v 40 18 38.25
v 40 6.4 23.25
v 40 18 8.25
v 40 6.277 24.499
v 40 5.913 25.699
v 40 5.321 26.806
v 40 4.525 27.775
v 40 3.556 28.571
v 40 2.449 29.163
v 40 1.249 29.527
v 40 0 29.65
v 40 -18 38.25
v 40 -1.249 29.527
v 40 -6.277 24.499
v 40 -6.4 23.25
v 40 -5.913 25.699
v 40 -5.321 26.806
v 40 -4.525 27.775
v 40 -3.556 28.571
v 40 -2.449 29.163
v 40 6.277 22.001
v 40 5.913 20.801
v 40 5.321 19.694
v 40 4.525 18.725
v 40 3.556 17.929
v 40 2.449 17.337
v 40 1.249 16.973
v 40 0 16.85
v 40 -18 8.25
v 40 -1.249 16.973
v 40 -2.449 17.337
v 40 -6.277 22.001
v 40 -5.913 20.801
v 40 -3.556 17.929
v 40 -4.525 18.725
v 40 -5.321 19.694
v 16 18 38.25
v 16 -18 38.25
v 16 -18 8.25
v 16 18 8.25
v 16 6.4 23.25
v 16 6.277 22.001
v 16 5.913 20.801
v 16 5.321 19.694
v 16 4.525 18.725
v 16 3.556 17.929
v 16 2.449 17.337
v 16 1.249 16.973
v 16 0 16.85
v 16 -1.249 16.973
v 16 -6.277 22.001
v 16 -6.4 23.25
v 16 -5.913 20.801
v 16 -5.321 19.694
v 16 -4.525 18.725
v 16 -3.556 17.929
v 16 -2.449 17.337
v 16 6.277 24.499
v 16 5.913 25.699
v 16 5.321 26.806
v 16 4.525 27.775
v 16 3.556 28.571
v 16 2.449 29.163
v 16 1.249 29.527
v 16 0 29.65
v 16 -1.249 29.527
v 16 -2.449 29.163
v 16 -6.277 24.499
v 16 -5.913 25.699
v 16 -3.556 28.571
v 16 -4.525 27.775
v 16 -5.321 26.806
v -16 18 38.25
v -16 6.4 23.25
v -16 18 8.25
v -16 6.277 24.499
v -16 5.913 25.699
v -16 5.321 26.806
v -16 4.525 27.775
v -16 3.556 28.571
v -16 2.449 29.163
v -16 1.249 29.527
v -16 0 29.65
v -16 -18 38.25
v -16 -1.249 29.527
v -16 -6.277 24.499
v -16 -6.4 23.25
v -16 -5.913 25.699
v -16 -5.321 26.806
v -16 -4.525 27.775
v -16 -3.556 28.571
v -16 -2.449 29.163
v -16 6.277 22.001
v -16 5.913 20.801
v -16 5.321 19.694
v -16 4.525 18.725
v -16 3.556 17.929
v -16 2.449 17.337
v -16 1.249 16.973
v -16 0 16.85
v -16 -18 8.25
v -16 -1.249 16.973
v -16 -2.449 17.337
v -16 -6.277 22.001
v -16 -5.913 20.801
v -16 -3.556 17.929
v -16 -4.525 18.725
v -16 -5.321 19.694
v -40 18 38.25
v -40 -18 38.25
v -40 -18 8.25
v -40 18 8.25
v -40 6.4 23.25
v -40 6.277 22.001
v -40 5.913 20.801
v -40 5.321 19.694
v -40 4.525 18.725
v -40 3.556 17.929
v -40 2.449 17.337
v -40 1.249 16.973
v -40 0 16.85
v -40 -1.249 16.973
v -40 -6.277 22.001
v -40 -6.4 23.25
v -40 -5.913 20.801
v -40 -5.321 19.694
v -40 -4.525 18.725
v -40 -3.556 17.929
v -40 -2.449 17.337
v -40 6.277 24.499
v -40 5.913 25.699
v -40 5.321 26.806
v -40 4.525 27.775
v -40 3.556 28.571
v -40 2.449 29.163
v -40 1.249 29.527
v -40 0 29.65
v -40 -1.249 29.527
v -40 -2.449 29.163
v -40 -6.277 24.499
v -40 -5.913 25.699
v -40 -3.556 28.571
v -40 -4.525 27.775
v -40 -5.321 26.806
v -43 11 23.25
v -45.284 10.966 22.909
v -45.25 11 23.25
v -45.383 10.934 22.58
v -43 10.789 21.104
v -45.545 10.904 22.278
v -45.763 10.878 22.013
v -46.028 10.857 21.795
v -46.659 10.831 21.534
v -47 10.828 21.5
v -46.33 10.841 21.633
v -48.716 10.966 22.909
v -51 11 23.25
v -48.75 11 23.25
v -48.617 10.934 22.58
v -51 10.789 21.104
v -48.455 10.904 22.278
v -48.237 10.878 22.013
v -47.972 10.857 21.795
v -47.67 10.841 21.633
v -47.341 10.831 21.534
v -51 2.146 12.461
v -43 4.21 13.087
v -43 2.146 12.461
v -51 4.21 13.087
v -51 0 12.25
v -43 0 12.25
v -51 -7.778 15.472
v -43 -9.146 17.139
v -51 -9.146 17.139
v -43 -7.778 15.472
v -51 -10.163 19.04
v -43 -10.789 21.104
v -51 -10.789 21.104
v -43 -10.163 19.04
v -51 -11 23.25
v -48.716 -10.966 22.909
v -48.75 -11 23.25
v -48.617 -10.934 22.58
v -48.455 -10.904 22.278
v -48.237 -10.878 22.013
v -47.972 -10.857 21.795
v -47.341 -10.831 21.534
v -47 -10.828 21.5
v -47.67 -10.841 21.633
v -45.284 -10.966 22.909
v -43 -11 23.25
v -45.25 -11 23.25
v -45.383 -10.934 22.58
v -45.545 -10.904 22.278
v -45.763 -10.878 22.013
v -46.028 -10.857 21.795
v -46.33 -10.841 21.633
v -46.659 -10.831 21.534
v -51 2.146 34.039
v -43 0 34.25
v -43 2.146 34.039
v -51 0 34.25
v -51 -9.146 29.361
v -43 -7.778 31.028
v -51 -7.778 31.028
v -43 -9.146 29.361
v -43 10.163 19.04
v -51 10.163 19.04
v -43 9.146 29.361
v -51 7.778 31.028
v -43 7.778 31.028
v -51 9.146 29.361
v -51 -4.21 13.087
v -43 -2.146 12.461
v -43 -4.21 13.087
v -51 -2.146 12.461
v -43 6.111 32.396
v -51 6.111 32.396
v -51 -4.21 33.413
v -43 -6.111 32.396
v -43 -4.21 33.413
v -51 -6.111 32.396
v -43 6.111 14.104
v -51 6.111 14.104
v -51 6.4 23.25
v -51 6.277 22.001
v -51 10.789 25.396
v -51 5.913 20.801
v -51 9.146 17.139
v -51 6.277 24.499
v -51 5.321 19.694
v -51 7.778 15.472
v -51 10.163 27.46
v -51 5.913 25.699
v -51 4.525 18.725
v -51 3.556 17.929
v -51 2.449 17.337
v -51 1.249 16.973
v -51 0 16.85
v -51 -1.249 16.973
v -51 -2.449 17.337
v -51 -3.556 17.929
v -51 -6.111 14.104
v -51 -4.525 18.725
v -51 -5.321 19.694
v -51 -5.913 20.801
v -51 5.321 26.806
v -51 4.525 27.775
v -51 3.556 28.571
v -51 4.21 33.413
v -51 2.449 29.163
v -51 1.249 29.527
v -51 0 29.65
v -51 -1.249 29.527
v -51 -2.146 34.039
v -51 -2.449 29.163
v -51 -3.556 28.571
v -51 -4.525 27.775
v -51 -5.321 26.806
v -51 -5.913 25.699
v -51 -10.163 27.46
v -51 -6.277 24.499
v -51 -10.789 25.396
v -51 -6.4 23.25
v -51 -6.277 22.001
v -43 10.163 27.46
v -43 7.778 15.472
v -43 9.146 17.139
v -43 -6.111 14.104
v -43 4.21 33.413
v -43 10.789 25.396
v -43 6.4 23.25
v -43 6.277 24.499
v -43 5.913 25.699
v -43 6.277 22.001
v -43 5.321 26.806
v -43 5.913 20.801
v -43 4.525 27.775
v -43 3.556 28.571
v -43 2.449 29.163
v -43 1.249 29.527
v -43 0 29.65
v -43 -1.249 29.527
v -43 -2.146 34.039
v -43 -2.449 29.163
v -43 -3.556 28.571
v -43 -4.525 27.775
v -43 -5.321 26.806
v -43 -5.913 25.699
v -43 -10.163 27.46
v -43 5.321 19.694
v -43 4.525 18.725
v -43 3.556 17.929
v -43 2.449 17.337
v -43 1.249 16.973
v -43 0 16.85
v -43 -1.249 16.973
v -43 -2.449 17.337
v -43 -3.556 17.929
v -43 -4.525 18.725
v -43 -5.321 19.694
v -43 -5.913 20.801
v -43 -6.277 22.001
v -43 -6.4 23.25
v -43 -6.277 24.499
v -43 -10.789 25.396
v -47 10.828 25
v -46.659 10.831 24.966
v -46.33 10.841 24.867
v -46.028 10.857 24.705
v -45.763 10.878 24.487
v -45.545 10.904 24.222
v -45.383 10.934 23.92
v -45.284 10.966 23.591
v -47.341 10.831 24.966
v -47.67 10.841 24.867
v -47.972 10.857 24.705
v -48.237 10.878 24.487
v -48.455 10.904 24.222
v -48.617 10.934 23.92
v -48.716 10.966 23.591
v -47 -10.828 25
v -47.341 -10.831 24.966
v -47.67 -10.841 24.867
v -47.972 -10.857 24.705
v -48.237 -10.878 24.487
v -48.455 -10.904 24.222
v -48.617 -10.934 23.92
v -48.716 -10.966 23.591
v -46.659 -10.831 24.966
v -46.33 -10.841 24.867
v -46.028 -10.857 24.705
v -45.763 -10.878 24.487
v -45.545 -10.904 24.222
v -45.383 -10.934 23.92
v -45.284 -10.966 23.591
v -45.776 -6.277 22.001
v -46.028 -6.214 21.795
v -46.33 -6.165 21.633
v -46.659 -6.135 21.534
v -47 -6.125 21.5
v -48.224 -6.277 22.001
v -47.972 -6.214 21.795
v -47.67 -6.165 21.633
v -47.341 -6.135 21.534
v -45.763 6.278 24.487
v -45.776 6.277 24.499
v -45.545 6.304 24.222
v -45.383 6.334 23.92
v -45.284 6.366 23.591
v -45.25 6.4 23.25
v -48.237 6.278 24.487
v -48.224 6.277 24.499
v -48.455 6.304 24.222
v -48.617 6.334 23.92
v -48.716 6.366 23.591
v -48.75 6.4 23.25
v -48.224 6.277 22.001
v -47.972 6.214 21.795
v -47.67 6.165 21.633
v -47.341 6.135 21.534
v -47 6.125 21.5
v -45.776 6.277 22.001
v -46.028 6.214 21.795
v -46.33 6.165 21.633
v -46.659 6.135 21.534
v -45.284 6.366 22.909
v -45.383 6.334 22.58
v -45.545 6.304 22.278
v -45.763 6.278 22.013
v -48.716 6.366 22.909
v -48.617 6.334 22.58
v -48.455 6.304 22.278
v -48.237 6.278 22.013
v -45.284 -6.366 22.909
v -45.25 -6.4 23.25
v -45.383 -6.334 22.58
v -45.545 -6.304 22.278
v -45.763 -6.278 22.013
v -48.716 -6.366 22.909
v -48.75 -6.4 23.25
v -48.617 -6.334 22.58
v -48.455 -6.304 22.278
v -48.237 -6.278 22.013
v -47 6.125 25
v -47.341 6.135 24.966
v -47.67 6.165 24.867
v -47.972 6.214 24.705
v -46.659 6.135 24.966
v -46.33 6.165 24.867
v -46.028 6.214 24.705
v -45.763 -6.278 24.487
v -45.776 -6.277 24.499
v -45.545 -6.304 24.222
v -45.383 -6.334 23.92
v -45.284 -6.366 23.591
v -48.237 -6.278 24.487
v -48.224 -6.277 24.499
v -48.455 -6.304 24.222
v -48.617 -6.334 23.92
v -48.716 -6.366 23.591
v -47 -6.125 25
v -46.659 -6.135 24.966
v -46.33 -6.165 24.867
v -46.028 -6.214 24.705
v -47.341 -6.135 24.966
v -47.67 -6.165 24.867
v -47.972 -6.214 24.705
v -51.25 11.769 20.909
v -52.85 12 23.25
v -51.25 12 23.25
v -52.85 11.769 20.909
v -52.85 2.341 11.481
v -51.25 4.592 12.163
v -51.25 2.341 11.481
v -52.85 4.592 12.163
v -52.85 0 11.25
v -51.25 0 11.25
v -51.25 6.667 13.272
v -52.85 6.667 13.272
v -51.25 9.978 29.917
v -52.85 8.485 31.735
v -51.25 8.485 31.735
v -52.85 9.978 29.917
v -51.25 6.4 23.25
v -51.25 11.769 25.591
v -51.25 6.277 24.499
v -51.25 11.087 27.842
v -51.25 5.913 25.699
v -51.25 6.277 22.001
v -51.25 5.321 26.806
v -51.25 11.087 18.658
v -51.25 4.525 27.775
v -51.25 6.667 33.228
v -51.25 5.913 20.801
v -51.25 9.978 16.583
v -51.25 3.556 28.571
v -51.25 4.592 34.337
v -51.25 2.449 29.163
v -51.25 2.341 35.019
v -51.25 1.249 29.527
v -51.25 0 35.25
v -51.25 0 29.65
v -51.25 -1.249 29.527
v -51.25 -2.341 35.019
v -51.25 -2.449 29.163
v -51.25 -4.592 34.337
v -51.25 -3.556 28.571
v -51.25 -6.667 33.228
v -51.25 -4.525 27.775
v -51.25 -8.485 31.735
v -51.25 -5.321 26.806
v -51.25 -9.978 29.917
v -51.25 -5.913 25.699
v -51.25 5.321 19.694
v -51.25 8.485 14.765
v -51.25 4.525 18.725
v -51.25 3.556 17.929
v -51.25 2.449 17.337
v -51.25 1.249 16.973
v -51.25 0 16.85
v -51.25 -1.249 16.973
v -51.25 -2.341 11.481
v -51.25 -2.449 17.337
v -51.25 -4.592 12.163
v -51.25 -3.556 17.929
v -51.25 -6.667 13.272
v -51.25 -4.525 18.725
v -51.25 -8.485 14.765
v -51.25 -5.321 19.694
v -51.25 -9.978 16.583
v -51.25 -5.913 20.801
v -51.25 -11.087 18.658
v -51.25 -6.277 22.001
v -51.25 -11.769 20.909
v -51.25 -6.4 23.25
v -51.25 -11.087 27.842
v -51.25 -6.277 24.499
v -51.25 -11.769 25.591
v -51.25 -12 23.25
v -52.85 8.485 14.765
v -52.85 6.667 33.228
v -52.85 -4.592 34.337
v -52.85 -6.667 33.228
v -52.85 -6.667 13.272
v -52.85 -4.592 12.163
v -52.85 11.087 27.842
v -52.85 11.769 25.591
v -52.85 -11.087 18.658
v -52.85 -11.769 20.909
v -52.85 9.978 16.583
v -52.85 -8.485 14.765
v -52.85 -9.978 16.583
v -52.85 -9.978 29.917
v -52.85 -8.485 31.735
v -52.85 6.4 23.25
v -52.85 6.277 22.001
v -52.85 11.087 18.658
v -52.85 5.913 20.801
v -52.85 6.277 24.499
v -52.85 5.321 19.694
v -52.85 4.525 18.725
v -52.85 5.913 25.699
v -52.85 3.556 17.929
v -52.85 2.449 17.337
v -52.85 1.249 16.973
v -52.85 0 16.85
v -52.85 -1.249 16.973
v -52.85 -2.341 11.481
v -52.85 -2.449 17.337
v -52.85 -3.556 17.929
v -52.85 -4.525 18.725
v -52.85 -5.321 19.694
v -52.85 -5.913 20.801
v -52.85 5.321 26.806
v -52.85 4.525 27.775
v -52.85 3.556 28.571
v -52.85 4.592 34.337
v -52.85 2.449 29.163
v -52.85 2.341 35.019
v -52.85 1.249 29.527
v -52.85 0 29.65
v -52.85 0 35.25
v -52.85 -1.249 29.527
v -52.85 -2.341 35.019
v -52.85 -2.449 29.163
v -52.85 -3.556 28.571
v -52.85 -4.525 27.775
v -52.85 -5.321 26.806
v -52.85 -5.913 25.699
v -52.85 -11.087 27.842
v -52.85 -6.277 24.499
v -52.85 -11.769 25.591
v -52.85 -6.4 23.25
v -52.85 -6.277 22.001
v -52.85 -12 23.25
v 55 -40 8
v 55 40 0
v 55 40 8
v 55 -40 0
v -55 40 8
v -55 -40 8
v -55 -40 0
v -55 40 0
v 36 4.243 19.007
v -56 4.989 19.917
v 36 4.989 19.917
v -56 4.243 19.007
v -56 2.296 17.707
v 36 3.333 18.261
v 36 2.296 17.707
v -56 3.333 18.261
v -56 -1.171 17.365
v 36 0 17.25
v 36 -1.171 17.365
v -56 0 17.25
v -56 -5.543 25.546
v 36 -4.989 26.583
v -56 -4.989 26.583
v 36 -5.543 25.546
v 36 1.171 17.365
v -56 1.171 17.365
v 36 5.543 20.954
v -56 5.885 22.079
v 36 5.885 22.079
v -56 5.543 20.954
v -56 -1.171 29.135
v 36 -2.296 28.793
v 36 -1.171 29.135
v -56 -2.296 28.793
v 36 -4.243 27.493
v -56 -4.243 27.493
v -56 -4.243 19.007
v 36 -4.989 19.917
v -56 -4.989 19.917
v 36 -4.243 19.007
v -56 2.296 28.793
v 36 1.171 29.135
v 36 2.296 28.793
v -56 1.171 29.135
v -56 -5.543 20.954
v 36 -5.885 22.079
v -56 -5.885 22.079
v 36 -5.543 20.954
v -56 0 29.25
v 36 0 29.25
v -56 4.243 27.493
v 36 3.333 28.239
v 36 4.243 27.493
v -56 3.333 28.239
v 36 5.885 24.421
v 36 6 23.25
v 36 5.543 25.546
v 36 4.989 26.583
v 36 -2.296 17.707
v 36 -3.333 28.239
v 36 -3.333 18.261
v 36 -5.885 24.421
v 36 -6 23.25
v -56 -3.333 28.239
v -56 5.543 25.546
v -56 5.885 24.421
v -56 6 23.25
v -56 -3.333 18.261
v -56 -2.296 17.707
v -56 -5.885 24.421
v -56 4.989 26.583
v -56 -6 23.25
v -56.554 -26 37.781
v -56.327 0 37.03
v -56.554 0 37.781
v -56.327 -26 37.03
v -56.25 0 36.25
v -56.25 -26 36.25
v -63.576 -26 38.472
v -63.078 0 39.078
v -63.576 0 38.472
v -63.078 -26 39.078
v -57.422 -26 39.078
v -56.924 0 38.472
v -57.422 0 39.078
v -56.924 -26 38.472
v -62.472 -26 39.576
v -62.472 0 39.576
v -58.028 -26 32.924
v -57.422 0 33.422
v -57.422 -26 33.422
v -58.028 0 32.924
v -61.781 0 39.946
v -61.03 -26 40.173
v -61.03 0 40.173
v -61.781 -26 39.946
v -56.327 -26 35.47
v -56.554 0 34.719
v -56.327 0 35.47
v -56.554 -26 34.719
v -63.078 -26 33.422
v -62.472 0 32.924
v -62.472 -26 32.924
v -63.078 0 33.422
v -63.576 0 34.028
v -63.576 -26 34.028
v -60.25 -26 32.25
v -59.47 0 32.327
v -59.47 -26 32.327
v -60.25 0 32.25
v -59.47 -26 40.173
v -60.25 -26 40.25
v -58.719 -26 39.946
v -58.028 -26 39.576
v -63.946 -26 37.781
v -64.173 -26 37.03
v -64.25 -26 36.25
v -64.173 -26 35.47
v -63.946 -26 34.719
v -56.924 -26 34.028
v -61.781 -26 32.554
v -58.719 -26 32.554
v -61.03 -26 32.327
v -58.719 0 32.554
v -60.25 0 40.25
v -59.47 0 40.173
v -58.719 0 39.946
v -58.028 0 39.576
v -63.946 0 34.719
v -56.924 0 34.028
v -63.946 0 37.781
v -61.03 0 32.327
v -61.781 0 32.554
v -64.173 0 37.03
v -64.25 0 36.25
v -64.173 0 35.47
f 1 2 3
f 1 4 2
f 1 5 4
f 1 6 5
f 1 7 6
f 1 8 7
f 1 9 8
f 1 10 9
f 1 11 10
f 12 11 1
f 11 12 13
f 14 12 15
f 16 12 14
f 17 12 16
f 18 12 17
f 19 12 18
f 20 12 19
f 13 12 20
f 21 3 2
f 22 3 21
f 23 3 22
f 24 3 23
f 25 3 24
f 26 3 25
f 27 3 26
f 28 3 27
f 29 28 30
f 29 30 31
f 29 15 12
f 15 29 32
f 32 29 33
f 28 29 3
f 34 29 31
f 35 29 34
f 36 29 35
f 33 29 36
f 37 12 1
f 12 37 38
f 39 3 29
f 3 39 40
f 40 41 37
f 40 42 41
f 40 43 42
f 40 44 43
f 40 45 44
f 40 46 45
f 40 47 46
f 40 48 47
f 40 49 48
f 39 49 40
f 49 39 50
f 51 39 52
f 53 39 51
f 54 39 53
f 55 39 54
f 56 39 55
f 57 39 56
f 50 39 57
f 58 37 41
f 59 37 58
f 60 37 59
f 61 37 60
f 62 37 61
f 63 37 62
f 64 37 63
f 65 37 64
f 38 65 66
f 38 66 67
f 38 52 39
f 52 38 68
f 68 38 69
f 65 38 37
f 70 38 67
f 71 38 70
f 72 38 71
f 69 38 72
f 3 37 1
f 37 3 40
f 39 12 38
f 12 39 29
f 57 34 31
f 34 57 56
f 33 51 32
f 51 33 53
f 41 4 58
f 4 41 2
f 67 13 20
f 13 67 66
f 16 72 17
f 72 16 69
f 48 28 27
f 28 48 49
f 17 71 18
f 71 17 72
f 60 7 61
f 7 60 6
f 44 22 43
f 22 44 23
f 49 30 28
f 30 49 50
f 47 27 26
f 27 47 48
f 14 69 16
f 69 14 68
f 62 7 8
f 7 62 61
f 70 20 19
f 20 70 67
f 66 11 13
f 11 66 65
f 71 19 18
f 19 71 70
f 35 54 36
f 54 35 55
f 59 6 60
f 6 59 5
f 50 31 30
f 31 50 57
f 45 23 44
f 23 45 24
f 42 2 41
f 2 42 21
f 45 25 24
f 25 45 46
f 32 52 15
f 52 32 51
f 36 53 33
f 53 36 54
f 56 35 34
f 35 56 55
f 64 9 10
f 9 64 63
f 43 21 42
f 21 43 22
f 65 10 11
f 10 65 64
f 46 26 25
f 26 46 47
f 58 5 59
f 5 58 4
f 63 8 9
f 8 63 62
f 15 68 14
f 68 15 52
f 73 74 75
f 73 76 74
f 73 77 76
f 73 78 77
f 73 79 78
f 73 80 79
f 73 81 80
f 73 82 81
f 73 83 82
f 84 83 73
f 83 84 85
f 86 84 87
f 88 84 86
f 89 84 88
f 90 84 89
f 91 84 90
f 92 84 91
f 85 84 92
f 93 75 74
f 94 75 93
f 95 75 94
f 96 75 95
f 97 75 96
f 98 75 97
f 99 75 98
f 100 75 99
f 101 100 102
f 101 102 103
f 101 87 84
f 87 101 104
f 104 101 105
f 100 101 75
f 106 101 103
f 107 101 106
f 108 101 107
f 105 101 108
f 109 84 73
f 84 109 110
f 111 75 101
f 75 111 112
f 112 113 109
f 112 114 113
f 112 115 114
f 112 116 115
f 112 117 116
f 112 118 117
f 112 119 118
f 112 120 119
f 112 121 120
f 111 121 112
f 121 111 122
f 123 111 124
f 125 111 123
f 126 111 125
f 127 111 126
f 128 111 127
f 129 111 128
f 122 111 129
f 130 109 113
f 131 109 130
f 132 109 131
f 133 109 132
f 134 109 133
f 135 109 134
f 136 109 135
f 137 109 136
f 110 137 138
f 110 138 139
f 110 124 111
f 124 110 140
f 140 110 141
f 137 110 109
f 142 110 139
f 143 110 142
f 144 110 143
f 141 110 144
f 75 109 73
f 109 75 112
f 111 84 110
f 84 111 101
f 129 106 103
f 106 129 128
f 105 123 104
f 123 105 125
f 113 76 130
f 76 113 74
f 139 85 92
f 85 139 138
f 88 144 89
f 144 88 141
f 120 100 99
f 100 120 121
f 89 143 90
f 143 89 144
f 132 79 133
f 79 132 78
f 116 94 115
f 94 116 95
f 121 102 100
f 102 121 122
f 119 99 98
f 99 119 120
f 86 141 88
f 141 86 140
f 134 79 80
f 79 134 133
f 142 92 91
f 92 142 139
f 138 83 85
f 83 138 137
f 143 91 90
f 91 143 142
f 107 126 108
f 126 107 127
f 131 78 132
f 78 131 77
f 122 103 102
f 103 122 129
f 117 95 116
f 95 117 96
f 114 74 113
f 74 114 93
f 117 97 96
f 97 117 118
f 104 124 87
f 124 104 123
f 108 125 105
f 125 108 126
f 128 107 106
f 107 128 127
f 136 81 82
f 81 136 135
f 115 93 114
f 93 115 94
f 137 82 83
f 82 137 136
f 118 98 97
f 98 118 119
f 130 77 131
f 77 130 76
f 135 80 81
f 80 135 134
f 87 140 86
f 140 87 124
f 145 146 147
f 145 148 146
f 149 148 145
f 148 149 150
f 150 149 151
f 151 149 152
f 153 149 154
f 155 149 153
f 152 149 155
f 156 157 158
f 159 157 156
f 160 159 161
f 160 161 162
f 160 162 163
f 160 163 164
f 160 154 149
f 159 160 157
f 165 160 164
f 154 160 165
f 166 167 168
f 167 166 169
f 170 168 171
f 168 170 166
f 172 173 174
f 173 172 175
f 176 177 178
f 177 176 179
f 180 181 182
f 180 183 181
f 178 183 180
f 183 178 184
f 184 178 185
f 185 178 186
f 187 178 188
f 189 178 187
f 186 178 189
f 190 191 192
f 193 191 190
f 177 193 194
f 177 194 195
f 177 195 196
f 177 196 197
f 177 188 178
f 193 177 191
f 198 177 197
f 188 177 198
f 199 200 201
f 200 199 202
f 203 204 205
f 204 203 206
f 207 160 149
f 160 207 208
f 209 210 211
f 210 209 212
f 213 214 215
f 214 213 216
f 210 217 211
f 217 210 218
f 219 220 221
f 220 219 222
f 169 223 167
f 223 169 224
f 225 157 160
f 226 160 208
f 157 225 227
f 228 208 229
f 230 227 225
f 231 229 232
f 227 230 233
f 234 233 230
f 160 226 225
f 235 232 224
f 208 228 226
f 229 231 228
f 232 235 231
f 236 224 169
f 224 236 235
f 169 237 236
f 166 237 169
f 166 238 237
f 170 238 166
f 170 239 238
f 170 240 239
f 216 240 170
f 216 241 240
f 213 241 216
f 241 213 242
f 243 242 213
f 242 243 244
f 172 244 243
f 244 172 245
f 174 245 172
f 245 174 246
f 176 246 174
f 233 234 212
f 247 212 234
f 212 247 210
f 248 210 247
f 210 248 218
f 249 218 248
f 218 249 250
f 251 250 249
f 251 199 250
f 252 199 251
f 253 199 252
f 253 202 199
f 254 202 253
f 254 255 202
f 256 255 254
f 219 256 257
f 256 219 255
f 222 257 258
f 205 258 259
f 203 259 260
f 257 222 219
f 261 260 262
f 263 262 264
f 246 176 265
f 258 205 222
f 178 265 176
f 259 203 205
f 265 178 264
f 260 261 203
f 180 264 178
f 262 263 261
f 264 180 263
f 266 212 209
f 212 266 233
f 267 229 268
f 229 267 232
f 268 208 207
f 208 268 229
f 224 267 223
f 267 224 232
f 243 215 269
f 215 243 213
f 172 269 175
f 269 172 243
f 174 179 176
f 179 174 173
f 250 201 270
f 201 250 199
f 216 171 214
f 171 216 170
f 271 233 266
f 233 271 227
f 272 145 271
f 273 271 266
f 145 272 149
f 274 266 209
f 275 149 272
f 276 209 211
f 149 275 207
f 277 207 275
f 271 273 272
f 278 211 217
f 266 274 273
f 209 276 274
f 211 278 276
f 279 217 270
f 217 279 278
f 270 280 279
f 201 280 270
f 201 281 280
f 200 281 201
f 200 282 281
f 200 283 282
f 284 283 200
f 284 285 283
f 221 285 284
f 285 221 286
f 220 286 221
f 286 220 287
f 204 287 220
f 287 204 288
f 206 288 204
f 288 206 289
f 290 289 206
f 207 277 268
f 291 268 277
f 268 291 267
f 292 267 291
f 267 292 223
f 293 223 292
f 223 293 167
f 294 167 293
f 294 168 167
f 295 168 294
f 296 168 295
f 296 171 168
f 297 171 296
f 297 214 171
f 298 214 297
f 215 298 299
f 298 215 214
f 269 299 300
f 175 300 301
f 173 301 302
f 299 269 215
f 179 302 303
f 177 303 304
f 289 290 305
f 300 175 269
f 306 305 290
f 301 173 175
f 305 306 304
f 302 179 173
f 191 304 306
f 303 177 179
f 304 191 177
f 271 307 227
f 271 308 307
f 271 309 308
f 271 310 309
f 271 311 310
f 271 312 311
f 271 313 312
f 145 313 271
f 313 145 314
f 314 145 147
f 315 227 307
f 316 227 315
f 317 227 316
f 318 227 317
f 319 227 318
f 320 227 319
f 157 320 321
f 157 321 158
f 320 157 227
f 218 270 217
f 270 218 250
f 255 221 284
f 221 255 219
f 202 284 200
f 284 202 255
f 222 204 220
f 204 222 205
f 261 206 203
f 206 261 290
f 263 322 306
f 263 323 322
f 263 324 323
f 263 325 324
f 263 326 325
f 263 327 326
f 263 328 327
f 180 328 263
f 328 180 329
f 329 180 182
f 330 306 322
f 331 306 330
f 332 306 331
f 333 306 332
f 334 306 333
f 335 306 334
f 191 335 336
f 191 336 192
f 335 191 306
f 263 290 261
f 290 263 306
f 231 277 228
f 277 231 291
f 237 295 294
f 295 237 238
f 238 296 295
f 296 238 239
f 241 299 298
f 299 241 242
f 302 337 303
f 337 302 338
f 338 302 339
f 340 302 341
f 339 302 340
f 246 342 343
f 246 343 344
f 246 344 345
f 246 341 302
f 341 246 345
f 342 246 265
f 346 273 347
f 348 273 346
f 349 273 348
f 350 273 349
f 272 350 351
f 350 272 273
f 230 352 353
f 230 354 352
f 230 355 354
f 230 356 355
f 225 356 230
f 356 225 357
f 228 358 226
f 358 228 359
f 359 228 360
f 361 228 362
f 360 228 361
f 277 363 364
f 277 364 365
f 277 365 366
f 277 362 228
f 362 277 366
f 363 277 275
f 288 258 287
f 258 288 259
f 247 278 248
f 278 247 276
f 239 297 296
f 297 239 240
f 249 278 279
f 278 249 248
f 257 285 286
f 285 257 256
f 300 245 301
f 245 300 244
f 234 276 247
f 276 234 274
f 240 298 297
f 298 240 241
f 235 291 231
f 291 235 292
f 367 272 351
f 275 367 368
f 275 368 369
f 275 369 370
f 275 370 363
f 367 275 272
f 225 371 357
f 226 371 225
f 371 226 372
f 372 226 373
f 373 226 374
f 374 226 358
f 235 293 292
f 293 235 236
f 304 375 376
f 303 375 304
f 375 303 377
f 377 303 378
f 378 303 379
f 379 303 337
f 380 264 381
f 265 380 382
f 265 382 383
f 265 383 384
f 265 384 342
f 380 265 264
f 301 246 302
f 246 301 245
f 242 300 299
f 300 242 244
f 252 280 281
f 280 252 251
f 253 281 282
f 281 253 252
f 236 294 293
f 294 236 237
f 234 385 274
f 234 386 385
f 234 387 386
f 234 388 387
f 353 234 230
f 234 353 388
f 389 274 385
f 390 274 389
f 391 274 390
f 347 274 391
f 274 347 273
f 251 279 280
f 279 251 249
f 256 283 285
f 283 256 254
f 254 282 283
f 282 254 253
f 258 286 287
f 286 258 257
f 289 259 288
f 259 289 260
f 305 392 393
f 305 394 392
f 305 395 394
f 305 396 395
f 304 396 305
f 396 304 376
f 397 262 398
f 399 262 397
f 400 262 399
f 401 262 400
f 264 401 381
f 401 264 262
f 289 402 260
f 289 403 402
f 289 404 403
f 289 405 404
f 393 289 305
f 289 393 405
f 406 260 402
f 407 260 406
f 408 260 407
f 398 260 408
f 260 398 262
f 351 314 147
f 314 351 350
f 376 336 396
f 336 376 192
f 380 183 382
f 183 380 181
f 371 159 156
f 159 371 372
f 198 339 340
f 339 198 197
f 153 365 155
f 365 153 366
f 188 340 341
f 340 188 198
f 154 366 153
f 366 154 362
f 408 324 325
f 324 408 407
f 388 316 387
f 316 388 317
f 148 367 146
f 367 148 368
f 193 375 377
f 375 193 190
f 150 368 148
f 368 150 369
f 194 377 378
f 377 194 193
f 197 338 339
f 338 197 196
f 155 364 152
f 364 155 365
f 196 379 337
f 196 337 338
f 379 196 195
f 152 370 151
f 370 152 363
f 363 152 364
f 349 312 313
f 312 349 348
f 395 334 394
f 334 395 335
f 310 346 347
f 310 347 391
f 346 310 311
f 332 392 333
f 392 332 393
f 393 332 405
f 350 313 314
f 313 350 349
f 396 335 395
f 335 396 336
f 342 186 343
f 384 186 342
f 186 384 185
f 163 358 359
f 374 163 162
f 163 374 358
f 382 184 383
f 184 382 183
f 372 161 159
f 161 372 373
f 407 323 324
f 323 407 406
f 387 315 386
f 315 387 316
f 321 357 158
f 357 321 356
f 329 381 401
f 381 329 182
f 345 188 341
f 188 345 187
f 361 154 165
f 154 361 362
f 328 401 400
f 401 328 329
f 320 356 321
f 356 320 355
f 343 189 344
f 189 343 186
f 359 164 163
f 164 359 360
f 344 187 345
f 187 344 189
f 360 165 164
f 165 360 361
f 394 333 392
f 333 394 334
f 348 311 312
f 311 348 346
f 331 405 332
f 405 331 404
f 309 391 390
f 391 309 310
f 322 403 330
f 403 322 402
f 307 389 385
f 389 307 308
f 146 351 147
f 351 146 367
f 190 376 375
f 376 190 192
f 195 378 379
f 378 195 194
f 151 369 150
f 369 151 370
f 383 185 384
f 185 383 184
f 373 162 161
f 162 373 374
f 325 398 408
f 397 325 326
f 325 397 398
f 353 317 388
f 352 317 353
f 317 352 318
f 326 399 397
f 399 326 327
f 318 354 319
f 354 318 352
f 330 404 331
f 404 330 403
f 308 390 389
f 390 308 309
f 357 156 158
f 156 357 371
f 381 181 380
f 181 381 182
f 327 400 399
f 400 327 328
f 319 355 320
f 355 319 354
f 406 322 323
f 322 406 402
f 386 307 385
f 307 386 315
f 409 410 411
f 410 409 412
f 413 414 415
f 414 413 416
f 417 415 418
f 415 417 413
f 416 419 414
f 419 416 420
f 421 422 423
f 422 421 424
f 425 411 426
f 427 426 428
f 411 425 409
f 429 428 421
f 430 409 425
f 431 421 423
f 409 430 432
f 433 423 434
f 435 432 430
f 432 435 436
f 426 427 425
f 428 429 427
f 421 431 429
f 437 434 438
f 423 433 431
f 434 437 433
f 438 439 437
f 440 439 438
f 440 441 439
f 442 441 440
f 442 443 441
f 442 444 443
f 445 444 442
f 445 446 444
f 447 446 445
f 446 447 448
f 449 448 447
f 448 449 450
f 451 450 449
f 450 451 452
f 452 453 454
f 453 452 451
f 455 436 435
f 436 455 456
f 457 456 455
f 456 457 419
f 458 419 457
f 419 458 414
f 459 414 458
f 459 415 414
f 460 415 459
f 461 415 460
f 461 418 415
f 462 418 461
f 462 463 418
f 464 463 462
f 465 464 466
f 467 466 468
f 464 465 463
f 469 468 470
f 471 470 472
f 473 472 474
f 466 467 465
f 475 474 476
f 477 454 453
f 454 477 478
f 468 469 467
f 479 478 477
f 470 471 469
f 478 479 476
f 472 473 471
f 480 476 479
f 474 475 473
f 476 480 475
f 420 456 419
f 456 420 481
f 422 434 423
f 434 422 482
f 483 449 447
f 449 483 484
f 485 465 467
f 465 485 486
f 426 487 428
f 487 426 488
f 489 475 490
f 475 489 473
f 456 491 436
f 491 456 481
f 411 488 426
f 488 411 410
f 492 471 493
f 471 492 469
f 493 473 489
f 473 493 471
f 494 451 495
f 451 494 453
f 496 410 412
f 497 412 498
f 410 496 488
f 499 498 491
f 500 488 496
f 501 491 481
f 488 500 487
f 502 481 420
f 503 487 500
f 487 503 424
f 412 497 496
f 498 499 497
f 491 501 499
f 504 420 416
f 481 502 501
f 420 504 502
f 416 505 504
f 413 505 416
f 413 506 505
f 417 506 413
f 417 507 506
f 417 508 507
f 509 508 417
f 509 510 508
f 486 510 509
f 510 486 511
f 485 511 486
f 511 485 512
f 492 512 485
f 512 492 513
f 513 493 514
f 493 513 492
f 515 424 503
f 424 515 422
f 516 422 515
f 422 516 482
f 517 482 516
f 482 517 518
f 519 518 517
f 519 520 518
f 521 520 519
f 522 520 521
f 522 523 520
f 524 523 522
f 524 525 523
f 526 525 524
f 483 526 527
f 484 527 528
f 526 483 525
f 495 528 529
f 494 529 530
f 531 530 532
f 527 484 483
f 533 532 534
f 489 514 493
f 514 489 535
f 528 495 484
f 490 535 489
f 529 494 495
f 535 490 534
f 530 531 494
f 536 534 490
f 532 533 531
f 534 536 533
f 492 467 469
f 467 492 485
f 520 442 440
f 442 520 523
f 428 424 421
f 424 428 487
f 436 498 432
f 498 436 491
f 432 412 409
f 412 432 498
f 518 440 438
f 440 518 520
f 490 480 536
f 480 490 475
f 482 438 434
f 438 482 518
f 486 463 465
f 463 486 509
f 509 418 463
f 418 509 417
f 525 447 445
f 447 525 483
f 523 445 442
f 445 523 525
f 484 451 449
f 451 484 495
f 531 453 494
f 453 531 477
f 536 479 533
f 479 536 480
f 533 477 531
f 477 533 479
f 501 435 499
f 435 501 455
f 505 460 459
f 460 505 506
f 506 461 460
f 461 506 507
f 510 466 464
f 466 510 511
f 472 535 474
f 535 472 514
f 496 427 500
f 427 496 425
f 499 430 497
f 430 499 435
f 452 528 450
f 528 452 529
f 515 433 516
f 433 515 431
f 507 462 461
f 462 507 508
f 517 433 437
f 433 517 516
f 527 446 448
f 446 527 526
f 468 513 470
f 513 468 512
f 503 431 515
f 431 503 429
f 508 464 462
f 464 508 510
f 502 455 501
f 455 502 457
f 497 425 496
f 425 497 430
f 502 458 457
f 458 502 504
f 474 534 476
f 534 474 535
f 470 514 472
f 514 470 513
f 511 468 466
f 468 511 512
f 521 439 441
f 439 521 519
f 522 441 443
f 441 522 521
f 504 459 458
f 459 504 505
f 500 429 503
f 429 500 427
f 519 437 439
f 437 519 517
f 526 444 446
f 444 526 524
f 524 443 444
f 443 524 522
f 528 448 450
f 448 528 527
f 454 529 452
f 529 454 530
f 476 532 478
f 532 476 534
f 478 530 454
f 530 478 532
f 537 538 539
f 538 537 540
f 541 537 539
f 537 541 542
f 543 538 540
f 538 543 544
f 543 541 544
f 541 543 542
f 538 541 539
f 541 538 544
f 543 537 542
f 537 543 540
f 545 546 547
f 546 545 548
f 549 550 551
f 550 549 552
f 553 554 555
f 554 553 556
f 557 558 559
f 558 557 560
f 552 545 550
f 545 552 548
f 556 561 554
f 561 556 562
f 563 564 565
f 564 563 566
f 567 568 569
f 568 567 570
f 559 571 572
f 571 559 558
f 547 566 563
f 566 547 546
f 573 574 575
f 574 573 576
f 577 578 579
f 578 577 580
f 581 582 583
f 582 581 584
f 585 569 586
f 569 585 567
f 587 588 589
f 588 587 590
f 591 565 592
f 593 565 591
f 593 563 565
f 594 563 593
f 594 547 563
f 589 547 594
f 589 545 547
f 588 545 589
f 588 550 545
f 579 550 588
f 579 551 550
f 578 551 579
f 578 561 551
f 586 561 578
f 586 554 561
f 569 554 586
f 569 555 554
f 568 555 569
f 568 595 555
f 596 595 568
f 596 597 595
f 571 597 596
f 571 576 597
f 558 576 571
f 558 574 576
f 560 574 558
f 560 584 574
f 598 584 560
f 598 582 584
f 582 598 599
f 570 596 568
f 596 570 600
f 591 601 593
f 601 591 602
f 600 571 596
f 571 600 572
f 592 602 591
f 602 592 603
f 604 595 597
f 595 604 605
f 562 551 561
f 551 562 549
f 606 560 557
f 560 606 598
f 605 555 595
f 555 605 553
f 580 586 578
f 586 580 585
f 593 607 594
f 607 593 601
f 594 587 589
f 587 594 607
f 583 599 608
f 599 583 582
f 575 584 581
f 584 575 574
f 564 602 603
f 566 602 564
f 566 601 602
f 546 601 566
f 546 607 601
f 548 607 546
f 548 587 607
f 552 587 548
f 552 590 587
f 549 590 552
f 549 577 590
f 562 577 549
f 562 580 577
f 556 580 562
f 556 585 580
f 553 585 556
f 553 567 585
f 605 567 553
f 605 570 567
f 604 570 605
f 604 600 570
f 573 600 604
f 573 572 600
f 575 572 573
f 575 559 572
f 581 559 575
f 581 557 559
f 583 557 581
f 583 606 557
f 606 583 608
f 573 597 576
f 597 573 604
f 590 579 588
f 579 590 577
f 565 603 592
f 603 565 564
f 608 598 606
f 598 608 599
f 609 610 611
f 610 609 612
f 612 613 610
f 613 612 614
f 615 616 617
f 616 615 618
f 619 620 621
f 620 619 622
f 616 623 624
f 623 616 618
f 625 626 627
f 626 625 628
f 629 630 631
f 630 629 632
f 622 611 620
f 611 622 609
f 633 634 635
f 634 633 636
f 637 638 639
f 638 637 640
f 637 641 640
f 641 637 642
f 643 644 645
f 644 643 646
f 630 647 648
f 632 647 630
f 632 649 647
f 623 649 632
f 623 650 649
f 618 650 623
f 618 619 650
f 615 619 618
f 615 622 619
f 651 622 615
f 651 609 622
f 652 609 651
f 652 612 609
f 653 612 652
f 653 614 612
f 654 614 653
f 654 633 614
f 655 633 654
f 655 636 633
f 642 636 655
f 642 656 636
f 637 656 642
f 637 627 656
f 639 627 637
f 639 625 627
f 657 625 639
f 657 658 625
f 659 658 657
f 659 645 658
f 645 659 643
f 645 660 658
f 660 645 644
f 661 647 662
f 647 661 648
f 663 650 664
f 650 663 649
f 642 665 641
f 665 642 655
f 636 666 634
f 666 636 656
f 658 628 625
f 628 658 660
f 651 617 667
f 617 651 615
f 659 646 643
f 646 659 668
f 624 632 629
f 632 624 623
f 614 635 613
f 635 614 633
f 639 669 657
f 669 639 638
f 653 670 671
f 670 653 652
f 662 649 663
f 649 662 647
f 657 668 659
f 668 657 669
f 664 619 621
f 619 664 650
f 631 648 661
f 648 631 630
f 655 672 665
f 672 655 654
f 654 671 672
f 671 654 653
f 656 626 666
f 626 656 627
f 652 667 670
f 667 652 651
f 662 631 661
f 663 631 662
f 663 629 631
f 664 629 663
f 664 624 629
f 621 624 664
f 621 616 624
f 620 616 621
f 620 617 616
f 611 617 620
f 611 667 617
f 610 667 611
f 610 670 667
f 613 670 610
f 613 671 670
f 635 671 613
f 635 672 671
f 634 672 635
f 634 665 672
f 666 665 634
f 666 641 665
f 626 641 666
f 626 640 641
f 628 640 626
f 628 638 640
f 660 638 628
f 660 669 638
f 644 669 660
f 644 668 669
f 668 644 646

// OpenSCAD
$fn = 32;

// ------------------------------------------------------------------------
// Machine vise: screw d12, jaws 24 x 30 mm
// Every part is its own module, assembly() places every instance.
// ------------------------------------------------------------------------

// --- part 1 ---
module vise_bed() {
  difference() {
    translate([-55, -40, 0]) cube([110, 80, 8]);
  }
}

// --- part 2 ---
module vise_jaw() {
  difference() {
    translate([-12, -18, 0]) cube([24, 36, 30]);
    translate([0, 0, 15]) rotate([0, 90, 0]) cylinder(h = 26, d = 12.8, center = true);
  }
}

// --- part 3 ---
module vise_screw() {
  translate([0, 0, -46]) cylinder(h = 92, d = 12);
}

// --- part 4 ---
module screw_collar() {
  difference() {
    cylinder(h = 8, d = 22);
    translate([0, 0, -1]) cylinder(h = 10, d = 12.8);
    translate([0, 0, 4]) rotate([90, 0, 0]) cylinder(h = 24, d = 3.5, center = true);
  }
}

// --- part 5 ---
module screw_washer() {
  difference() {
      translate([0, 0, 0]) cylinder(h = 1.6, d = 24);
      translate([0, 0, -1]) cylinder(h = 3.6, d = 12.8);
    }
}

// --- part 6 ---
module vise_handle() {
  cylinder(h = 26, d = 8);
}

// --- assembly ---
module assembly() {
  color([0.80, 0.24, 0.20]) translate([0, 0, 0]) rotate([0, 0, 0]) vise_bed();
  color([0.20, 0.45, 0.75]) translate([28, 0, 8.25]) rotate([0, 0, 0]) vise_jaw();
  color([0.25, 0.62, 0.32]) translate([-28, 0, 8.25]) rotate([0, 0, 0]) vise_jaw();
  color([0.92, 0.70, 0.18]) translate([-10, 0, 23.25]) rotate([0, 90, 0]) vise_screw();
  color([0.58, 0.35, 0.70]) translate([-51, 0, 23.25]) rotate([0, 90, 0]) screw_collar();
  color([0.16, 0.66, 0.66]) translate([-52.85, 0, 23.25]) rotate([0, 90, 0]) screw_washer();
  color([0.85, 0.48, 0.18]) translate([-60.25, 0, 36.25]) rotate([90, 0, 0]) vise_handle();
}

assembly();
